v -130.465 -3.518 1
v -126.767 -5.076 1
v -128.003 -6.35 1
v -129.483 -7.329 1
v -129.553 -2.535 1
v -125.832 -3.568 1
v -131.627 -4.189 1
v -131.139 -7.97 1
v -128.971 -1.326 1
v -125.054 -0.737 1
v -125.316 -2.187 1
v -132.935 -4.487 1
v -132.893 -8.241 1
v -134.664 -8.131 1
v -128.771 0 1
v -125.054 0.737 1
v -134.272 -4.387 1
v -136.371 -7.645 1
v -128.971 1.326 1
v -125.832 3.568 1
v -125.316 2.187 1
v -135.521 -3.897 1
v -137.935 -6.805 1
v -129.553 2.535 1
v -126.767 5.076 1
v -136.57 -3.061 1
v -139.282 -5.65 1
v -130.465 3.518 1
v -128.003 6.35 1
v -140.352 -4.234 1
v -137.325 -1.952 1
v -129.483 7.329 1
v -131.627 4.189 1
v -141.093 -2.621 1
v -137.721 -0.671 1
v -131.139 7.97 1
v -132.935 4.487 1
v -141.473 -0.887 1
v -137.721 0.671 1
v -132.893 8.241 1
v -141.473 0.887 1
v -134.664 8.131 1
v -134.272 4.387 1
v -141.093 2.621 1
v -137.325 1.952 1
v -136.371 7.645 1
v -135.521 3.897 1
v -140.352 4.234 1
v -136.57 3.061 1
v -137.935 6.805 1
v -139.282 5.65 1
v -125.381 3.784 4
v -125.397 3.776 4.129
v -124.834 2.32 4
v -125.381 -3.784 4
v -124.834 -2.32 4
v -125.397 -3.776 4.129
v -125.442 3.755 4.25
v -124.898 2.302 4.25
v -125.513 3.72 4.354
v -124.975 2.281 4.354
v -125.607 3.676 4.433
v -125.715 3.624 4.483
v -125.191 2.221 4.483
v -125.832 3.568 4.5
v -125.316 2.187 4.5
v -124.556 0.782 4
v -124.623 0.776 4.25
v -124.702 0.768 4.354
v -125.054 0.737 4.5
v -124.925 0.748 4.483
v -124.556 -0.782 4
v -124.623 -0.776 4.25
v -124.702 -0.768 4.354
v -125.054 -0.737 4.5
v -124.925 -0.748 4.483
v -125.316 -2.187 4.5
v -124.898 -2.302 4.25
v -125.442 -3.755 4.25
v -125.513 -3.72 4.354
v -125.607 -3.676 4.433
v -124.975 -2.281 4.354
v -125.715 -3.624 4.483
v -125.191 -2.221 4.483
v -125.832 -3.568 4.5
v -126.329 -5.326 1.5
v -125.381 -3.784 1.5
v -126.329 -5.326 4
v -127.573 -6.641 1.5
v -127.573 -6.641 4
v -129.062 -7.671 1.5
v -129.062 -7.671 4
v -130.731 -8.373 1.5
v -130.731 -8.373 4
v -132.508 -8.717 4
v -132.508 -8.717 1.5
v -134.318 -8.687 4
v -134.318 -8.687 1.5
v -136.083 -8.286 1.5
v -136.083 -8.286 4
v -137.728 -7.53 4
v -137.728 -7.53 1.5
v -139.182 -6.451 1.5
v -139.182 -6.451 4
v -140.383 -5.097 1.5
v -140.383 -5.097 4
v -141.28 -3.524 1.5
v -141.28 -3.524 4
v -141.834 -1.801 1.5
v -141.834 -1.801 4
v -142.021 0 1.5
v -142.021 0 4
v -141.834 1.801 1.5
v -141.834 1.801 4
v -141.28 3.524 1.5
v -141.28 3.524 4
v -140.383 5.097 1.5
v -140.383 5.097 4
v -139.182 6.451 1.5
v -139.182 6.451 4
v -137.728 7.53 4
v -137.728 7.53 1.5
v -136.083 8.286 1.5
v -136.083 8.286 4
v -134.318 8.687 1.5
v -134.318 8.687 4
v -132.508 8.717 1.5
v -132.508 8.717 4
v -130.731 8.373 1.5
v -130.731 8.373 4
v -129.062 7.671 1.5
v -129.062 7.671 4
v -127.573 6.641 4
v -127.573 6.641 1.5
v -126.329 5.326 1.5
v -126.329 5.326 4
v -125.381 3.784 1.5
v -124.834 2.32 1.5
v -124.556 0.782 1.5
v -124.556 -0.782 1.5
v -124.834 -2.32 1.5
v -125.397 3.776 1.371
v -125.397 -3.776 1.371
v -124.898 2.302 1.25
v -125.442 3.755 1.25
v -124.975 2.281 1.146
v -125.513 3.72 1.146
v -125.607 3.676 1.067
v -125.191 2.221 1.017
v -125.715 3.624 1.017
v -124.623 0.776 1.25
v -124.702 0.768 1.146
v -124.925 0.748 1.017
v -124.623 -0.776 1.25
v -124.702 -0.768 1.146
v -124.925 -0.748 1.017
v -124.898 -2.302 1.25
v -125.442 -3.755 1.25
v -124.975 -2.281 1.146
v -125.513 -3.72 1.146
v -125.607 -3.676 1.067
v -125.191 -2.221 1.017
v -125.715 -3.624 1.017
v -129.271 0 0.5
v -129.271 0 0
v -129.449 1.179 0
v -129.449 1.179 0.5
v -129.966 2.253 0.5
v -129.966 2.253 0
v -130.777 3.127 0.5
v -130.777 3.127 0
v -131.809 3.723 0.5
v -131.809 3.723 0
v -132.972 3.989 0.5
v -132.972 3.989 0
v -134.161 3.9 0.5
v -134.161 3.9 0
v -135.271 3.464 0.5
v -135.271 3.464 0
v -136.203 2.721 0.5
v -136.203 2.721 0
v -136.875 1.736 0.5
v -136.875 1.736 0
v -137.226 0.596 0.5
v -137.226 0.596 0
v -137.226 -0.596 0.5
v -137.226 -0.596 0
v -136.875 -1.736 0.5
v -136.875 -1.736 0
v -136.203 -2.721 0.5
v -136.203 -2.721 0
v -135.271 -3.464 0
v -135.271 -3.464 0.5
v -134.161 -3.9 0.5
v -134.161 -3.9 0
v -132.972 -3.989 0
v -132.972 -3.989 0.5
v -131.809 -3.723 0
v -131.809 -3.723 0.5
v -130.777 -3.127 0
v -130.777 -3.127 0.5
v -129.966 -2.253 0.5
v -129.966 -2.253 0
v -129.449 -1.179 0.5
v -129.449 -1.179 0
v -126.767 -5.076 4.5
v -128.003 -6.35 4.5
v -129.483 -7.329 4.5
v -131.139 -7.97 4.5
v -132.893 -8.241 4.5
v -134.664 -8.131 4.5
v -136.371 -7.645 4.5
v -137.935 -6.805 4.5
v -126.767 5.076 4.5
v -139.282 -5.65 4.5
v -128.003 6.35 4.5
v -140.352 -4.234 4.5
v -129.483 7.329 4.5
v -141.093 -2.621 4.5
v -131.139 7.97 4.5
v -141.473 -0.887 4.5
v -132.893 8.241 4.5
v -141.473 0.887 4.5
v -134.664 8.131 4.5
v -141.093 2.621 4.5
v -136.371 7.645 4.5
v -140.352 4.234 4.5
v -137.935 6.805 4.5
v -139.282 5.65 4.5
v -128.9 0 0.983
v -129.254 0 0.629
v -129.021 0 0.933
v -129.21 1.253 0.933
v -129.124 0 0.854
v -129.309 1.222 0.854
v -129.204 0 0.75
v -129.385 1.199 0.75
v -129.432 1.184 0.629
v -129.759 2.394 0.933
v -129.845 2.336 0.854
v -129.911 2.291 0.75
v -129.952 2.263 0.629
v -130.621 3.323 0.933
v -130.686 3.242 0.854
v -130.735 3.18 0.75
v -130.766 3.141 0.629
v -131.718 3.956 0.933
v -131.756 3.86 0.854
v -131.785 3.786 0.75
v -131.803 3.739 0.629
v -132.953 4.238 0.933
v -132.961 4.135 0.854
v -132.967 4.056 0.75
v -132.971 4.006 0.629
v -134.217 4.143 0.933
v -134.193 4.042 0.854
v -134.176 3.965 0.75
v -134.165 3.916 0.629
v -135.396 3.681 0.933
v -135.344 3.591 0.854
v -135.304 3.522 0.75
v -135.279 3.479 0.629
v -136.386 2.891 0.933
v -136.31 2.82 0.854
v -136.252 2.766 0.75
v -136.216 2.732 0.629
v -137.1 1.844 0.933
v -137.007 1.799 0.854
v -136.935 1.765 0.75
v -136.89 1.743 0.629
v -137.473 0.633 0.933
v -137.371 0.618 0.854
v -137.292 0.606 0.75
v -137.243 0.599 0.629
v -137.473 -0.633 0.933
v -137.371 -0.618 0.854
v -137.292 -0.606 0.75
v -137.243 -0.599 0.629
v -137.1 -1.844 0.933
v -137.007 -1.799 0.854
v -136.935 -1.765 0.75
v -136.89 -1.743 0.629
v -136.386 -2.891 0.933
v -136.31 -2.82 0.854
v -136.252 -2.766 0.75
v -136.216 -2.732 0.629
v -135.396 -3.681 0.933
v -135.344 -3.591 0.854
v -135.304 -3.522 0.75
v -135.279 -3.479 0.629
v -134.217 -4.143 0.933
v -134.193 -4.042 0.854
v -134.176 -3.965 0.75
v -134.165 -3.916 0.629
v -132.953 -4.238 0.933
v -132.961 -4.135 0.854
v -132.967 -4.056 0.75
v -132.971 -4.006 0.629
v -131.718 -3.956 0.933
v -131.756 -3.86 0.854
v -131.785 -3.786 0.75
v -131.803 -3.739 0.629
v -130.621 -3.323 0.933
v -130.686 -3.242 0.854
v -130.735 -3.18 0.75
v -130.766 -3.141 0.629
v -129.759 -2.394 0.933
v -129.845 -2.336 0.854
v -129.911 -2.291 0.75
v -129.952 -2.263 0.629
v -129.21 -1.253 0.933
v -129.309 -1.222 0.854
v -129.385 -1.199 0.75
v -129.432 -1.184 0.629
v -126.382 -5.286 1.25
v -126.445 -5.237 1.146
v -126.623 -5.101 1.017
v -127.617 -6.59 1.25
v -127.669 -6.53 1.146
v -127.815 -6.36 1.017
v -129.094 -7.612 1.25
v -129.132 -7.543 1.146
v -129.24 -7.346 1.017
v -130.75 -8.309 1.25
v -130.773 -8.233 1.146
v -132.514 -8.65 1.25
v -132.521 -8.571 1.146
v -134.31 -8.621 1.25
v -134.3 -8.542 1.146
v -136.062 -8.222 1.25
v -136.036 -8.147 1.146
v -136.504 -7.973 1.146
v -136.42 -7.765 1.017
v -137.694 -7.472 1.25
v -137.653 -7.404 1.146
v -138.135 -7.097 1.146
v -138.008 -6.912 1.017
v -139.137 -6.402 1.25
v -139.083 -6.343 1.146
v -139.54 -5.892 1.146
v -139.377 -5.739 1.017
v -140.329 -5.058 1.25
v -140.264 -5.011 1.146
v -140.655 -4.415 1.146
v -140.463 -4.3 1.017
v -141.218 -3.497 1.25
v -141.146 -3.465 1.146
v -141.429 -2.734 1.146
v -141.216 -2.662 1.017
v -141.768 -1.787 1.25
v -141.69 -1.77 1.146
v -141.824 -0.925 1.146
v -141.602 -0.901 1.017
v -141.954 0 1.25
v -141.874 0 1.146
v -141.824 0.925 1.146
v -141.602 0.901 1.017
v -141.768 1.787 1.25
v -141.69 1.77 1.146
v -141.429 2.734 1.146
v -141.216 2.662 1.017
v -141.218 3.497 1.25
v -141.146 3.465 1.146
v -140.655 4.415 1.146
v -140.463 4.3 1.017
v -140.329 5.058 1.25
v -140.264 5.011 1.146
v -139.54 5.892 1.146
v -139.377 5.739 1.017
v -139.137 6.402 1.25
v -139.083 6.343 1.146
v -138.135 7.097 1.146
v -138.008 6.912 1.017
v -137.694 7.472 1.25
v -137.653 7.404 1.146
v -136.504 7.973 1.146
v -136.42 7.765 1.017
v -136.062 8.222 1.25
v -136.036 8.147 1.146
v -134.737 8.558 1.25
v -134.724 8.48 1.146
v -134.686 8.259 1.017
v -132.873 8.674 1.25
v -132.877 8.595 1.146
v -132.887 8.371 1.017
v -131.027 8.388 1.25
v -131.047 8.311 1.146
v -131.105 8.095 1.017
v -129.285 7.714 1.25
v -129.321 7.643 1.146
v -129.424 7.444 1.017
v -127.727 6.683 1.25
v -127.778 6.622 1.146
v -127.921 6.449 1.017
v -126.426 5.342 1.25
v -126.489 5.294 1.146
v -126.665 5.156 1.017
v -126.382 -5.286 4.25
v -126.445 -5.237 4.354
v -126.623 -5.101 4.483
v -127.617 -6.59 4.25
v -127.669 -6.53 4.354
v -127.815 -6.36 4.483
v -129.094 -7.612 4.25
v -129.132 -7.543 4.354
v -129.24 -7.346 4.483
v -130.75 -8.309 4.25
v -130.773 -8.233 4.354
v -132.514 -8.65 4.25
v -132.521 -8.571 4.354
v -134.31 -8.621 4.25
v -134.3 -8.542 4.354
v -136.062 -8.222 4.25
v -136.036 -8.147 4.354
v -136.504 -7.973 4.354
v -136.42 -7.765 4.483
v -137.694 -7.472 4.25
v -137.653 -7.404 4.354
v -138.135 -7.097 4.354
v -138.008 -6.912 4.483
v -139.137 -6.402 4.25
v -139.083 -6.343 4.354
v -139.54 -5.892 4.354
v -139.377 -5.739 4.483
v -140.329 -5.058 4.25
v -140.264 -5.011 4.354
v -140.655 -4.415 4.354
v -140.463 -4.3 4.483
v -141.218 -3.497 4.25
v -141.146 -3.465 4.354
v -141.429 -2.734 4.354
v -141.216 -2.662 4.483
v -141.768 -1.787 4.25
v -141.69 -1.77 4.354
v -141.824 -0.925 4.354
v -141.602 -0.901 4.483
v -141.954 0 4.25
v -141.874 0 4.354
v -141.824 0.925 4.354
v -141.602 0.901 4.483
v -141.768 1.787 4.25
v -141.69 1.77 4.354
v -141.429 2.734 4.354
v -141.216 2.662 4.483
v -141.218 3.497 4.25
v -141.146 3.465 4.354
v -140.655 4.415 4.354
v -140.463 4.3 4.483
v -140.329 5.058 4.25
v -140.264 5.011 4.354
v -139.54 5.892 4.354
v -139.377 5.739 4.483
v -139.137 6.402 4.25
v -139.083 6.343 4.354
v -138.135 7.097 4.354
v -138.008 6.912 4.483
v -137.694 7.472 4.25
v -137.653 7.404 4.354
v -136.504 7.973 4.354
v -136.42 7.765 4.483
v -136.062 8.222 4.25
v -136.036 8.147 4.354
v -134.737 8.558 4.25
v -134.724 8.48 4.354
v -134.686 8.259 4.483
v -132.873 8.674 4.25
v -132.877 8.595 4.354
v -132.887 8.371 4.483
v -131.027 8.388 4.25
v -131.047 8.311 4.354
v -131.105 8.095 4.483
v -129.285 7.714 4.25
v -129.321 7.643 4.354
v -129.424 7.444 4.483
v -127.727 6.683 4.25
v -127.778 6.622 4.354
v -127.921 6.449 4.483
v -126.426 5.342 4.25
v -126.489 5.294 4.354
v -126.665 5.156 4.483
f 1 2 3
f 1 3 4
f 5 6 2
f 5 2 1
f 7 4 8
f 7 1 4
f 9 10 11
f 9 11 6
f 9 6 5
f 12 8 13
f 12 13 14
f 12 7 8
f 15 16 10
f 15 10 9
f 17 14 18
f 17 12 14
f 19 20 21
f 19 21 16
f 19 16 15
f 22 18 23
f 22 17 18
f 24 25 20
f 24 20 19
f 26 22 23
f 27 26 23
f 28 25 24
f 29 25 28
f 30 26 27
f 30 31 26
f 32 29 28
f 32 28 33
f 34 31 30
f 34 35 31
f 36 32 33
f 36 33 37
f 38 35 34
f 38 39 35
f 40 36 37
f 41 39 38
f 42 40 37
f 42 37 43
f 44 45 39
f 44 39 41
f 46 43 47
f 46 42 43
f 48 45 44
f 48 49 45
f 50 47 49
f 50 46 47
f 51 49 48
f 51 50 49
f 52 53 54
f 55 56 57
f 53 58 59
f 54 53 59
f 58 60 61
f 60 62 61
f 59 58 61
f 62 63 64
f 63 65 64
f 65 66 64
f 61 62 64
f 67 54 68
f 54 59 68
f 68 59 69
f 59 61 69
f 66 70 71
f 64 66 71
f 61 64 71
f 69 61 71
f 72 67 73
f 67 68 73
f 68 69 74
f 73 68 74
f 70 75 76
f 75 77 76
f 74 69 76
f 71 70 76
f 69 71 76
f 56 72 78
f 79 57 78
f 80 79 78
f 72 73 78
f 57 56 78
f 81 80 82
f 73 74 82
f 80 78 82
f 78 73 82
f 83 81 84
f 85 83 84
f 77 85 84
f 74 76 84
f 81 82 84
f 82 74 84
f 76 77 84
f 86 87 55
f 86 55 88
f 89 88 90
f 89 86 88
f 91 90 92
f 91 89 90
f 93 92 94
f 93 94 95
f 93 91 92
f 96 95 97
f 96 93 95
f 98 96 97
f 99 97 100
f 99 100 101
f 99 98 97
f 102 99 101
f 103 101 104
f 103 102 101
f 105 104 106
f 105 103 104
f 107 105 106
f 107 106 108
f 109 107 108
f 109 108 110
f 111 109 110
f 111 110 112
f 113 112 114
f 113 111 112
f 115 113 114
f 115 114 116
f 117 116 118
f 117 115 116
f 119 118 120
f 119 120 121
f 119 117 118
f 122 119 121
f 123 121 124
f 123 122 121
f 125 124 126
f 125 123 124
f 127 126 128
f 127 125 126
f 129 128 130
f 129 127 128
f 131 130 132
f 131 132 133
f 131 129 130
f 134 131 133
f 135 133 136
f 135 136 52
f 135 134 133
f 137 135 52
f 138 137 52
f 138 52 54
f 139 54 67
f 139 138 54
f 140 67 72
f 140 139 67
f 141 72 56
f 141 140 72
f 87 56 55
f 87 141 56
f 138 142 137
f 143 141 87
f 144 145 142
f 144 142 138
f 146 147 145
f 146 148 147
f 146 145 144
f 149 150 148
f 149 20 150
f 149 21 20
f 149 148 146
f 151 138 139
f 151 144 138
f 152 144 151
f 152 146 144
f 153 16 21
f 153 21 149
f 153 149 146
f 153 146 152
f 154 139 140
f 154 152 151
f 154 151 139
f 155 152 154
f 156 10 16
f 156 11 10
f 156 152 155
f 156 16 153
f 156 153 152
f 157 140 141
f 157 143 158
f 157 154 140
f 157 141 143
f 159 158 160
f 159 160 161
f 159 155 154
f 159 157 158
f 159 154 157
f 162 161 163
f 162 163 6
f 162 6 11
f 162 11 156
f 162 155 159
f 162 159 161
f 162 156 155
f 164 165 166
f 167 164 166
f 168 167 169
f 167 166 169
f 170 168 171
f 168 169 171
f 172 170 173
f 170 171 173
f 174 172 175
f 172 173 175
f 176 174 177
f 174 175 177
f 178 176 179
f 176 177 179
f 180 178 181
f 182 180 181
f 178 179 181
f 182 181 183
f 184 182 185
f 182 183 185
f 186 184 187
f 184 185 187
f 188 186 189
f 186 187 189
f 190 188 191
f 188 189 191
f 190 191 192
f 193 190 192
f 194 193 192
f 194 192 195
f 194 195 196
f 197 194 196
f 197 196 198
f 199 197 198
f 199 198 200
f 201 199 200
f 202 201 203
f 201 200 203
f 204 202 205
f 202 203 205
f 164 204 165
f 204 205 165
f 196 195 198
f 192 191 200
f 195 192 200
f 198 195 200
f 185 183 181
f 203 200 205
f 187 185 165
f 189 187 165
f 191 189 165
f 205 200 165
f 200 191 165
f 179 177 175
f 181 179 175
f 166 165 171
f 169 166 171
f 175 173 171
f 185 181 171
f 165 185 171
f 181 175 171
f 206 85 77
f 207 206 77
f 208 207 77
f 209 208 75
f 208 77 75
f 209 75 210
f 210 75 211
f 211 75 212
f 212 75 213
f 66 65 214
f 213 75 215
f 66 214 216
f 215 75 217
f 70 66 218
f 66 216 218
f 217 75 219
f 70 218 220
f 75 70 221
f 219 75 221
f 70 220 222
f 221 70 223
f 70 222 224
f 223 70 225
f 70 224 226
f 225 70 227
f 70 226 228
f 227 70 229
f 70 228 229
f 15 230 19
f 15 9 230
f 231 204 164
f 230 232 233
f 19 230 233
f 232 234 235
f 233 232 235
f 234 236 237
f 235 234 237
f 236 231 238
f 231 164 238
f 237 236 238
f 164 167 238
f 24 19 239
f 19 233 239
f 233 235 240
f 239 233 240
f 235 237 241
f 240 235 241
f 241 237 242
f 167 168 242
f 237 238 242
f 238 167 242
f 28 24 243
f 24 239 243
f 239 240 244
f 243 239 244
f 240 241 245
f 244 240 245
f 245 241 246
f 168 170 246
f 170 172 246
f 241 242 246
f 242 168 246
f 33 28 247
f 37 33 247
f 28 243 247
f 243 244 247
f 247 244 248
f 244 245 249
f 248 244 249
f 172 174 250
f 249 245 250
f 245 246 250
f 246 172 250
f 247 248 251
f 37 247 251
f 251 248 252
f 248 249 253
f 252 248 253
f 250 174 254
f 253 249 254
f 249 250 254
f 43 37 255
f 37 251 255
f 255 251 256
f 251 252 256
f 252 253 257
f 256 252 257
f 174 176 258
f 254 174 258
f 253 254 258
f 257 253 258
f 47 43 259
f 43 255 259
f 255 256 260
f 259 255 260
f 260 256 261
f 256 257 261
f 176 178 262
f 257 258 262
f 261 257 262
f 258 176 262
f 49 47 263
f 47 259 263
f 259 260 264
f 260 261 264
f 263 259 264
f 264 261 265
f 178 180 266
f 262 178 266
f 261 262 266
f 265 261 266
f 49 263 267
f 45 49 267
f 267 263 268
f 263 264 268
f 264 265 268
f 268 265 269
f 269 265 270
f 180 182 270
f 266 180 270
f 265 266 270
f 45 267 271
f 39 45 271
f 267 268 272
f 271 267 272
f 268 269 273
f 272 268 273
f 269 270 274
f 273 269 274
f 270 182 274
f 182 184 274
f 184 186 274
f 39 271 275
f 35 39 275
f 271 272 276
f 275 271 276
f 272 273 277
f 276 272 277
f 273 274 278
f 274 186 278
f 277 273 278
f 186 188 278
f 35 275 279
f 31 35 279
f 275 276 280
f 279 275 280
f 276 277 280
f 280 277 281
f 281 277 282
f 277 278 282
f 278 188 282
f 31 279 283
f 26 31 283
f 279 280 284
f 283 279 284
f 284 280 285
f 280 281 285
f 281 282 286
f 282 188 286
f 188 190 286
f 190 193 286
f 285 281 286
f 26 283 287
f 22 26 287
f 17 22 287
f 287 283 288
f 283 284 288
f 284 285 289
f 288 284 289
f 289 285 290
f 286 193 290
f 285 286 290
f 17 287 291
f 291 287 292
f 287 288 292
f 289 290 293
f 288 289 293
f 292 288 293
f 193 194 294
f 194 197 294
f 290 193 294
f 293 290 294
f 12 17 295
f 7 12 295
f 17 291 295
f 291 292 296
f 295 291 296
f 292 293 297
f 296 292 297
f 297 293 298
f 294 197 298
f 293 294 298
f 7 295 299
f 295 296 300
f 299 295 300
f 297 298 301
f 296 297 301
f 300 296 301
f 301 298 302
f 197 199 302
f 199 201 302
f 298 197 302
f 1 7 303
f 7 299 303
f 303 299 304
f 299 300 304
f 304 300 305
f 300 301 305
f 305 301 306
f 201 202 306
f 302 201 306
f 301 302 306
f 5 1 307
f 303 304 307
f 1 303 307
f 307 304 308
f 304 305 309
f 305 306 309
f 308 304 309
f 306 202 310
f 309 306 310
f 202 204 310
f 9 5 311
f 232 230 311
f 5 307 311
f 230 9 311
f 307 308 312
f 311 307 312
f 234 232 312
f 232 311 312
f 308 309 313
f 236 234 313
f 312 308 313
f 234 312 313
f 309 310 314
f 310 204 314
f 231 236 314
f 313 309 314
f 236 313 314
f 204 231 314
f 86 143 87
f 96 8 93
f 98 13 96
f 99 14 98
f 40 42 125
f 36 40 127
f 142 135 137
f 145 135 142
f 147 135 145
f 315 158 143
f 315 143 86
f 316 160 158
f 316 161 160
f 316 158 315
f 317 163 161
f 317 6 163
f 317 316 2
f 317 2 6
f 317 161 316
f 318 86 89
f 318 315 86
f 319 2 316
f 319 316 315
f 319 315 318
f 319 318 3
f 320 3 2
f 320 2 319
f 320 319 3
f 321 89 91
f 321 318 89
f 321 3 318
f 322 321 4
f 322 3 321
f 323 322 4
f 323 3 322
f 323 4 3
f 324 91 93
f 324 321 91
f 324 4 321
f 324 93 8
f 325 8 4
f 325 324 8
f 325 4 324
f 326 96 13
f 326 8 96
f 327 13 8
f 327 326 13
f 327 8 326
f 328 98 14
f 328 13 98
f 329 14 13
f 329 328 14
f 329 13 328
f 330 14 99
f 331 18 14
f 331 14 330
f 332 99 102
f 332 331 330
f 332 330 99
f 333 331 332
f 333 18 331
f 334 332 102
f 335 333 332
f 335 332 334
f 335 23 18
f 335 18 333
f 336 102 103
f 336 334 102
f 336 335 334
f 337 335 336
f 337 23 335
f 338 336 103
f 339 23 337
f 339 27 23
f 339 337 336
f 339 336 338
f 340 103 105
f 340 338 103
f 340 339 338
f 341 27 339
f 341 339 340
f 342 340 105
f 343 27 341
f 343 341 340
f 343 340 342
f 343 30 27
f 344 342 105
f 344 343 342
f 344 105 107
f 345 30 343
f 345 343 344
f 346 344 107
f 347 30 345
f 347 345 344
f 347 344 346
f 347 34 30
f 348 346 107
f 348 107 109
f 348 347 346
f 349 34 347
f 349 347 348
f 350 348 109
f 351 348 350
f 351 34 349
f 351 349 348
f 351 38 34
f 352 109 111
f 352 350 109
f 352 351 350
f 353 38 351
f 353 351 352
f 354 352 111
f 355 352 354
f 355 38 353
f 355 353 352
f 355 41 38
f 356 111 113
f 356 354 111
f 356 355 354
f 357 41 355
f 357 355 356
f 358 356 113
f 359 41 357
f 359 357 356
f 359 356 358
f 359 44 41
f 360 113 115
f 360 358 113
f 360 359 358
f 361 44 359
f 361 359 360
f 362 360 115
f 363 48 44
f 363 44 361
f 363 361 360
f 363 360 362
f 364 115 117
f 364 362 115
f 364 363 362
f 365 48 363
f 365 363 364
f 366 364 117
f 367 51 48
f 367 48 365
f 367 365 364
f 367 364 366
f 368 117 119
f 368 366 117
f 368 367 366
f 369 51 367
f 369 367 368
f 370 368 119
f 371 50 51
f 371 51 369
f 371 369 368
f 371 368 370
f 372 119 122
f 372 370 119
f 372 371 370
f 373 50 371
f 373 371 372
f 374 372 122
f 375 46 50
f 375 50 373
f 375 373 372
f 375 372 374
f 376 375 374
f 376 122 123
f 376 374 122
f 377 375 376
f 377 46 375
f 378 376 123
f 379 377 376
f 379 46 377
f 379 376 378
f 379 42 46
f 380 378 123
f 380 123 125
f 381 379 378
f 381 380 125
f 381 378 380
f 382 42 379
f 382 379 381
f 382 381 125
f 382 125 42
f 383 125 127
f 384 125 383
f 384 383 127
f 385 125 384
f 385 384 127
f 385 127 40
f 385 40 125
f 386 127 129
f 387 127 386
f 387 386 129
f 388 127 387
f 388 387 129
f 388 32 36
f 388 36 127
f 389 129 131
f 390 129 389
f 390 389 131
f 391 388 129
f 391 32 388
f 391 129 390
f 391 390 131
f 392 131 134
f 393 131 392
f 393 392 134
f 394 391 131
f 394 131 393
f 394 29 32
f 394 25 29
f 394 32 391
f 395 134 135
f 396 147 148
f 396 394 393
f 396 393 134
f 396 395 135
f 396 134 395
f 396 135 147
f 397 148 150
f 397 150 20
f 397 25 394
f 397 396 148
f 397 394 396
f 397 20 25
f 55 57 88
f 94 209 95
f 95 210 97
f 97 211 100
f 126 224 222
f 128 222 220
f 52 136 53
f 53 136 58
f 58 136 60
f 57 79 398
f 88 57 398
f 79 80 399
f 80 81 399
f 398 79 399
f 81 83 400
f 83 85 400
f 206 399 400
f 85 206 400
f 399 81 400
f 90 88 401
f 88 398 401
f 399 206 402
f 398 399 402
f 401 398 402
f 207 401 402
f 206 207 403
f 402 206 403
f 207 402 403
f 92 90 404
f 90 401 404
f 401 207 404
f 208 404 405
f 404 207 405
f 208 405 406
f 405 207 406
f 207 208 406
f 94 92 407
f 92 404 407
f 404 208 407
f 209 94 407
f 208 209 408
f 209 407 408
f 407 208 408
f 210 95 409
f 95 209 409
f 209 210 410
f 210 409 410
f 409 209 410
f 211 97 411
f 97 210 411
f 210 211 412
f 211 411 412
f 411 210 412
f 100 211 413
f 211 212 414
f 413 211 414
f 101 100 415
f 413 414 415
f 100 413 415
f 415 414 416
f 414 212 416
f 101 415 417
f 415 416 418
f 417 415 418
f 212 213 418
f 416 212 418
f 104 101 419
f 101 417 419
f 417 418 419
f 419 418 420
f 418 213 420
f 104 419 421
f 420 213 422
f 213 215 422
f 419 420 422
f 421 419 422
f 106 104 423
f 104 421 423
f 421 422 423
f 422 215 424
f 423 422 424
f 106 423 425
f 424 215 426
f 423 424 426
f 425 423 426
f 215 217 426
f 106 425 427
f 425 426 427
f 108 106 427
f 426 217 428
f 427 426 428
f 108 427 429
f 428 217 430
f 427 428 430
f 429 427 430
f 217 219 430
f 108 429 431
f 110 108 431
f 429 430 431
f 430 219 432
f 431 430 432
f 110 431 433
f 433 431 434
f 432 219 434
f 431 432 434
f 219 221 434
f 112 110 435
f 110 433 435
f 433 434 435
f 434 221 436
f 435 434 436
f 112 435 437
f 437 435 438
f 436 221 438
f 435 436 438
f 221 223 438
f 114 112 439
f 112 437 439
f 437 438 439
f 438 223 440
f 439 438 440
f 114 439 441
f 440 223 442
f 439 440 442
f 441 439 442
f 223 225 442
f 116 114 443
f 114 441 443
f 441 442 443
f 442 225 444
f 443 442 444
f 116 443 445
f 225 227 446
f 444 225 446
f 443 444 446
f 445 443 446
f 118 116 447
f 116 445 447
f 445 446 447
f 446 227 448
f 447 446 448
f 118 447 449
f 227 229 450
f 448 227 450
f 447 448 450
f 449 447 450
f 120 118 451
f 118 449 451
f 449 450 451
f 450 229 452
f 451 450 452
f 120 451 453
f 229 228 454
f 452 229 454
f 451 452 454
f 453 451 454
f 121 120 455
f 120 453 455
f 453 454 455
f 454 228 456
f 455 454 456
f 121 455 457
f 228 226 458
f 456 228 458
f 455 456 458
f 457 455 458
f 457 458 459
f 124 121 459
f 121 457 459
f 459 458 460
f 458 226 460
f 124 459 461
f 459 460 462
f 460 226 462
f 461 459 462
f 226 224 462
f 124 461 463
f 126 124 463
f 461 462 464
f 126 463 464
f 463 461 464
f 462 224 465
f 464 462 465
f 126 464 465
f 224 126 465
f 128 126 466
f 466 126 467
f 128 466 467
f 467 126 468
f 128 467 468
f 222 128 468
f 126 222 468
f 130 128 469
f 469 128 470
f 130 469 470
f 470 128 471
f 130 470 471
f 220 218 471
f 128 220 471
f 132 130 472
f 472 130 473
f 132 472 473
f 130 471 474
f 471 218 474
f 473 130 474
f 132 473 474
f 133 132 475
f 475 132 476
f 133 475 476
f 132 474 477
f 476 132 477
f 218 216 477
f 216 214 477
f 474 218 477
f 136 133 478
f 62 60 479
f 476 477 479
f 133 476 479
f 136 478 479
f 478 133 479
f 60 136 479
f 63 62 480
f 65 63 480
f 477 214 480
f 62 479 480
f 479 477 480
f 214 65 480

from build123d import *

# Parameters (mm, degrees)
SKETCH1_R           = 4
BOSS_EXTRUDE1_DEPTH = 1
BOSS_EXTRUDE2_DEPTH = 3.5
FILLET1_R           = 0.5
FILLET3_R           = 0.5


with BuildPart() as part:
    # Sketch1 → Boss-Extrude1 (new body)
    with BuildSketch(Plane.XY):
        with Locations((-133.270827388, 0)):
            Circle(SKETCH1_R)
    extrude(amount=BOSS_EXTRUDE1_DEPTH)

    # Sketch2 → Boss-Extrude2 (add)
    with BuildSketch(Plane.XY.offset(1)):
        with BuildLine():
            ThreePointArc((-125.3812469, 3.783783784), (-124.520827388, 0), (-125.3812469, -3.783783784))
            ThreePointArc((-125.3812469, -3.783783784), (-142.020827388, 0), (-125.3812469, 3.783783784))
        make_face()
    extrude(amount=BOSS_EXTRUDE2_DEPTH)

    # Fillet1
    fillet1_edges = [part.edges().sort_by_distance(p)[0] for p in [
        (-137.270827388, 0, 1),
        (-141.160407876, -3.783783784, 1),
    ]]
    fillet(fillet1_edges, radius=FILLET1_R)

    # Fillet3
    fillet3_edges = [part.edges().sort_by_distance(p)[0] for p in [
        (-141.160407876, -3.783783784, 4.5),
    ]]
    fillet(fillet3_edges, radius=FILLET3_R)


solid = part.part
